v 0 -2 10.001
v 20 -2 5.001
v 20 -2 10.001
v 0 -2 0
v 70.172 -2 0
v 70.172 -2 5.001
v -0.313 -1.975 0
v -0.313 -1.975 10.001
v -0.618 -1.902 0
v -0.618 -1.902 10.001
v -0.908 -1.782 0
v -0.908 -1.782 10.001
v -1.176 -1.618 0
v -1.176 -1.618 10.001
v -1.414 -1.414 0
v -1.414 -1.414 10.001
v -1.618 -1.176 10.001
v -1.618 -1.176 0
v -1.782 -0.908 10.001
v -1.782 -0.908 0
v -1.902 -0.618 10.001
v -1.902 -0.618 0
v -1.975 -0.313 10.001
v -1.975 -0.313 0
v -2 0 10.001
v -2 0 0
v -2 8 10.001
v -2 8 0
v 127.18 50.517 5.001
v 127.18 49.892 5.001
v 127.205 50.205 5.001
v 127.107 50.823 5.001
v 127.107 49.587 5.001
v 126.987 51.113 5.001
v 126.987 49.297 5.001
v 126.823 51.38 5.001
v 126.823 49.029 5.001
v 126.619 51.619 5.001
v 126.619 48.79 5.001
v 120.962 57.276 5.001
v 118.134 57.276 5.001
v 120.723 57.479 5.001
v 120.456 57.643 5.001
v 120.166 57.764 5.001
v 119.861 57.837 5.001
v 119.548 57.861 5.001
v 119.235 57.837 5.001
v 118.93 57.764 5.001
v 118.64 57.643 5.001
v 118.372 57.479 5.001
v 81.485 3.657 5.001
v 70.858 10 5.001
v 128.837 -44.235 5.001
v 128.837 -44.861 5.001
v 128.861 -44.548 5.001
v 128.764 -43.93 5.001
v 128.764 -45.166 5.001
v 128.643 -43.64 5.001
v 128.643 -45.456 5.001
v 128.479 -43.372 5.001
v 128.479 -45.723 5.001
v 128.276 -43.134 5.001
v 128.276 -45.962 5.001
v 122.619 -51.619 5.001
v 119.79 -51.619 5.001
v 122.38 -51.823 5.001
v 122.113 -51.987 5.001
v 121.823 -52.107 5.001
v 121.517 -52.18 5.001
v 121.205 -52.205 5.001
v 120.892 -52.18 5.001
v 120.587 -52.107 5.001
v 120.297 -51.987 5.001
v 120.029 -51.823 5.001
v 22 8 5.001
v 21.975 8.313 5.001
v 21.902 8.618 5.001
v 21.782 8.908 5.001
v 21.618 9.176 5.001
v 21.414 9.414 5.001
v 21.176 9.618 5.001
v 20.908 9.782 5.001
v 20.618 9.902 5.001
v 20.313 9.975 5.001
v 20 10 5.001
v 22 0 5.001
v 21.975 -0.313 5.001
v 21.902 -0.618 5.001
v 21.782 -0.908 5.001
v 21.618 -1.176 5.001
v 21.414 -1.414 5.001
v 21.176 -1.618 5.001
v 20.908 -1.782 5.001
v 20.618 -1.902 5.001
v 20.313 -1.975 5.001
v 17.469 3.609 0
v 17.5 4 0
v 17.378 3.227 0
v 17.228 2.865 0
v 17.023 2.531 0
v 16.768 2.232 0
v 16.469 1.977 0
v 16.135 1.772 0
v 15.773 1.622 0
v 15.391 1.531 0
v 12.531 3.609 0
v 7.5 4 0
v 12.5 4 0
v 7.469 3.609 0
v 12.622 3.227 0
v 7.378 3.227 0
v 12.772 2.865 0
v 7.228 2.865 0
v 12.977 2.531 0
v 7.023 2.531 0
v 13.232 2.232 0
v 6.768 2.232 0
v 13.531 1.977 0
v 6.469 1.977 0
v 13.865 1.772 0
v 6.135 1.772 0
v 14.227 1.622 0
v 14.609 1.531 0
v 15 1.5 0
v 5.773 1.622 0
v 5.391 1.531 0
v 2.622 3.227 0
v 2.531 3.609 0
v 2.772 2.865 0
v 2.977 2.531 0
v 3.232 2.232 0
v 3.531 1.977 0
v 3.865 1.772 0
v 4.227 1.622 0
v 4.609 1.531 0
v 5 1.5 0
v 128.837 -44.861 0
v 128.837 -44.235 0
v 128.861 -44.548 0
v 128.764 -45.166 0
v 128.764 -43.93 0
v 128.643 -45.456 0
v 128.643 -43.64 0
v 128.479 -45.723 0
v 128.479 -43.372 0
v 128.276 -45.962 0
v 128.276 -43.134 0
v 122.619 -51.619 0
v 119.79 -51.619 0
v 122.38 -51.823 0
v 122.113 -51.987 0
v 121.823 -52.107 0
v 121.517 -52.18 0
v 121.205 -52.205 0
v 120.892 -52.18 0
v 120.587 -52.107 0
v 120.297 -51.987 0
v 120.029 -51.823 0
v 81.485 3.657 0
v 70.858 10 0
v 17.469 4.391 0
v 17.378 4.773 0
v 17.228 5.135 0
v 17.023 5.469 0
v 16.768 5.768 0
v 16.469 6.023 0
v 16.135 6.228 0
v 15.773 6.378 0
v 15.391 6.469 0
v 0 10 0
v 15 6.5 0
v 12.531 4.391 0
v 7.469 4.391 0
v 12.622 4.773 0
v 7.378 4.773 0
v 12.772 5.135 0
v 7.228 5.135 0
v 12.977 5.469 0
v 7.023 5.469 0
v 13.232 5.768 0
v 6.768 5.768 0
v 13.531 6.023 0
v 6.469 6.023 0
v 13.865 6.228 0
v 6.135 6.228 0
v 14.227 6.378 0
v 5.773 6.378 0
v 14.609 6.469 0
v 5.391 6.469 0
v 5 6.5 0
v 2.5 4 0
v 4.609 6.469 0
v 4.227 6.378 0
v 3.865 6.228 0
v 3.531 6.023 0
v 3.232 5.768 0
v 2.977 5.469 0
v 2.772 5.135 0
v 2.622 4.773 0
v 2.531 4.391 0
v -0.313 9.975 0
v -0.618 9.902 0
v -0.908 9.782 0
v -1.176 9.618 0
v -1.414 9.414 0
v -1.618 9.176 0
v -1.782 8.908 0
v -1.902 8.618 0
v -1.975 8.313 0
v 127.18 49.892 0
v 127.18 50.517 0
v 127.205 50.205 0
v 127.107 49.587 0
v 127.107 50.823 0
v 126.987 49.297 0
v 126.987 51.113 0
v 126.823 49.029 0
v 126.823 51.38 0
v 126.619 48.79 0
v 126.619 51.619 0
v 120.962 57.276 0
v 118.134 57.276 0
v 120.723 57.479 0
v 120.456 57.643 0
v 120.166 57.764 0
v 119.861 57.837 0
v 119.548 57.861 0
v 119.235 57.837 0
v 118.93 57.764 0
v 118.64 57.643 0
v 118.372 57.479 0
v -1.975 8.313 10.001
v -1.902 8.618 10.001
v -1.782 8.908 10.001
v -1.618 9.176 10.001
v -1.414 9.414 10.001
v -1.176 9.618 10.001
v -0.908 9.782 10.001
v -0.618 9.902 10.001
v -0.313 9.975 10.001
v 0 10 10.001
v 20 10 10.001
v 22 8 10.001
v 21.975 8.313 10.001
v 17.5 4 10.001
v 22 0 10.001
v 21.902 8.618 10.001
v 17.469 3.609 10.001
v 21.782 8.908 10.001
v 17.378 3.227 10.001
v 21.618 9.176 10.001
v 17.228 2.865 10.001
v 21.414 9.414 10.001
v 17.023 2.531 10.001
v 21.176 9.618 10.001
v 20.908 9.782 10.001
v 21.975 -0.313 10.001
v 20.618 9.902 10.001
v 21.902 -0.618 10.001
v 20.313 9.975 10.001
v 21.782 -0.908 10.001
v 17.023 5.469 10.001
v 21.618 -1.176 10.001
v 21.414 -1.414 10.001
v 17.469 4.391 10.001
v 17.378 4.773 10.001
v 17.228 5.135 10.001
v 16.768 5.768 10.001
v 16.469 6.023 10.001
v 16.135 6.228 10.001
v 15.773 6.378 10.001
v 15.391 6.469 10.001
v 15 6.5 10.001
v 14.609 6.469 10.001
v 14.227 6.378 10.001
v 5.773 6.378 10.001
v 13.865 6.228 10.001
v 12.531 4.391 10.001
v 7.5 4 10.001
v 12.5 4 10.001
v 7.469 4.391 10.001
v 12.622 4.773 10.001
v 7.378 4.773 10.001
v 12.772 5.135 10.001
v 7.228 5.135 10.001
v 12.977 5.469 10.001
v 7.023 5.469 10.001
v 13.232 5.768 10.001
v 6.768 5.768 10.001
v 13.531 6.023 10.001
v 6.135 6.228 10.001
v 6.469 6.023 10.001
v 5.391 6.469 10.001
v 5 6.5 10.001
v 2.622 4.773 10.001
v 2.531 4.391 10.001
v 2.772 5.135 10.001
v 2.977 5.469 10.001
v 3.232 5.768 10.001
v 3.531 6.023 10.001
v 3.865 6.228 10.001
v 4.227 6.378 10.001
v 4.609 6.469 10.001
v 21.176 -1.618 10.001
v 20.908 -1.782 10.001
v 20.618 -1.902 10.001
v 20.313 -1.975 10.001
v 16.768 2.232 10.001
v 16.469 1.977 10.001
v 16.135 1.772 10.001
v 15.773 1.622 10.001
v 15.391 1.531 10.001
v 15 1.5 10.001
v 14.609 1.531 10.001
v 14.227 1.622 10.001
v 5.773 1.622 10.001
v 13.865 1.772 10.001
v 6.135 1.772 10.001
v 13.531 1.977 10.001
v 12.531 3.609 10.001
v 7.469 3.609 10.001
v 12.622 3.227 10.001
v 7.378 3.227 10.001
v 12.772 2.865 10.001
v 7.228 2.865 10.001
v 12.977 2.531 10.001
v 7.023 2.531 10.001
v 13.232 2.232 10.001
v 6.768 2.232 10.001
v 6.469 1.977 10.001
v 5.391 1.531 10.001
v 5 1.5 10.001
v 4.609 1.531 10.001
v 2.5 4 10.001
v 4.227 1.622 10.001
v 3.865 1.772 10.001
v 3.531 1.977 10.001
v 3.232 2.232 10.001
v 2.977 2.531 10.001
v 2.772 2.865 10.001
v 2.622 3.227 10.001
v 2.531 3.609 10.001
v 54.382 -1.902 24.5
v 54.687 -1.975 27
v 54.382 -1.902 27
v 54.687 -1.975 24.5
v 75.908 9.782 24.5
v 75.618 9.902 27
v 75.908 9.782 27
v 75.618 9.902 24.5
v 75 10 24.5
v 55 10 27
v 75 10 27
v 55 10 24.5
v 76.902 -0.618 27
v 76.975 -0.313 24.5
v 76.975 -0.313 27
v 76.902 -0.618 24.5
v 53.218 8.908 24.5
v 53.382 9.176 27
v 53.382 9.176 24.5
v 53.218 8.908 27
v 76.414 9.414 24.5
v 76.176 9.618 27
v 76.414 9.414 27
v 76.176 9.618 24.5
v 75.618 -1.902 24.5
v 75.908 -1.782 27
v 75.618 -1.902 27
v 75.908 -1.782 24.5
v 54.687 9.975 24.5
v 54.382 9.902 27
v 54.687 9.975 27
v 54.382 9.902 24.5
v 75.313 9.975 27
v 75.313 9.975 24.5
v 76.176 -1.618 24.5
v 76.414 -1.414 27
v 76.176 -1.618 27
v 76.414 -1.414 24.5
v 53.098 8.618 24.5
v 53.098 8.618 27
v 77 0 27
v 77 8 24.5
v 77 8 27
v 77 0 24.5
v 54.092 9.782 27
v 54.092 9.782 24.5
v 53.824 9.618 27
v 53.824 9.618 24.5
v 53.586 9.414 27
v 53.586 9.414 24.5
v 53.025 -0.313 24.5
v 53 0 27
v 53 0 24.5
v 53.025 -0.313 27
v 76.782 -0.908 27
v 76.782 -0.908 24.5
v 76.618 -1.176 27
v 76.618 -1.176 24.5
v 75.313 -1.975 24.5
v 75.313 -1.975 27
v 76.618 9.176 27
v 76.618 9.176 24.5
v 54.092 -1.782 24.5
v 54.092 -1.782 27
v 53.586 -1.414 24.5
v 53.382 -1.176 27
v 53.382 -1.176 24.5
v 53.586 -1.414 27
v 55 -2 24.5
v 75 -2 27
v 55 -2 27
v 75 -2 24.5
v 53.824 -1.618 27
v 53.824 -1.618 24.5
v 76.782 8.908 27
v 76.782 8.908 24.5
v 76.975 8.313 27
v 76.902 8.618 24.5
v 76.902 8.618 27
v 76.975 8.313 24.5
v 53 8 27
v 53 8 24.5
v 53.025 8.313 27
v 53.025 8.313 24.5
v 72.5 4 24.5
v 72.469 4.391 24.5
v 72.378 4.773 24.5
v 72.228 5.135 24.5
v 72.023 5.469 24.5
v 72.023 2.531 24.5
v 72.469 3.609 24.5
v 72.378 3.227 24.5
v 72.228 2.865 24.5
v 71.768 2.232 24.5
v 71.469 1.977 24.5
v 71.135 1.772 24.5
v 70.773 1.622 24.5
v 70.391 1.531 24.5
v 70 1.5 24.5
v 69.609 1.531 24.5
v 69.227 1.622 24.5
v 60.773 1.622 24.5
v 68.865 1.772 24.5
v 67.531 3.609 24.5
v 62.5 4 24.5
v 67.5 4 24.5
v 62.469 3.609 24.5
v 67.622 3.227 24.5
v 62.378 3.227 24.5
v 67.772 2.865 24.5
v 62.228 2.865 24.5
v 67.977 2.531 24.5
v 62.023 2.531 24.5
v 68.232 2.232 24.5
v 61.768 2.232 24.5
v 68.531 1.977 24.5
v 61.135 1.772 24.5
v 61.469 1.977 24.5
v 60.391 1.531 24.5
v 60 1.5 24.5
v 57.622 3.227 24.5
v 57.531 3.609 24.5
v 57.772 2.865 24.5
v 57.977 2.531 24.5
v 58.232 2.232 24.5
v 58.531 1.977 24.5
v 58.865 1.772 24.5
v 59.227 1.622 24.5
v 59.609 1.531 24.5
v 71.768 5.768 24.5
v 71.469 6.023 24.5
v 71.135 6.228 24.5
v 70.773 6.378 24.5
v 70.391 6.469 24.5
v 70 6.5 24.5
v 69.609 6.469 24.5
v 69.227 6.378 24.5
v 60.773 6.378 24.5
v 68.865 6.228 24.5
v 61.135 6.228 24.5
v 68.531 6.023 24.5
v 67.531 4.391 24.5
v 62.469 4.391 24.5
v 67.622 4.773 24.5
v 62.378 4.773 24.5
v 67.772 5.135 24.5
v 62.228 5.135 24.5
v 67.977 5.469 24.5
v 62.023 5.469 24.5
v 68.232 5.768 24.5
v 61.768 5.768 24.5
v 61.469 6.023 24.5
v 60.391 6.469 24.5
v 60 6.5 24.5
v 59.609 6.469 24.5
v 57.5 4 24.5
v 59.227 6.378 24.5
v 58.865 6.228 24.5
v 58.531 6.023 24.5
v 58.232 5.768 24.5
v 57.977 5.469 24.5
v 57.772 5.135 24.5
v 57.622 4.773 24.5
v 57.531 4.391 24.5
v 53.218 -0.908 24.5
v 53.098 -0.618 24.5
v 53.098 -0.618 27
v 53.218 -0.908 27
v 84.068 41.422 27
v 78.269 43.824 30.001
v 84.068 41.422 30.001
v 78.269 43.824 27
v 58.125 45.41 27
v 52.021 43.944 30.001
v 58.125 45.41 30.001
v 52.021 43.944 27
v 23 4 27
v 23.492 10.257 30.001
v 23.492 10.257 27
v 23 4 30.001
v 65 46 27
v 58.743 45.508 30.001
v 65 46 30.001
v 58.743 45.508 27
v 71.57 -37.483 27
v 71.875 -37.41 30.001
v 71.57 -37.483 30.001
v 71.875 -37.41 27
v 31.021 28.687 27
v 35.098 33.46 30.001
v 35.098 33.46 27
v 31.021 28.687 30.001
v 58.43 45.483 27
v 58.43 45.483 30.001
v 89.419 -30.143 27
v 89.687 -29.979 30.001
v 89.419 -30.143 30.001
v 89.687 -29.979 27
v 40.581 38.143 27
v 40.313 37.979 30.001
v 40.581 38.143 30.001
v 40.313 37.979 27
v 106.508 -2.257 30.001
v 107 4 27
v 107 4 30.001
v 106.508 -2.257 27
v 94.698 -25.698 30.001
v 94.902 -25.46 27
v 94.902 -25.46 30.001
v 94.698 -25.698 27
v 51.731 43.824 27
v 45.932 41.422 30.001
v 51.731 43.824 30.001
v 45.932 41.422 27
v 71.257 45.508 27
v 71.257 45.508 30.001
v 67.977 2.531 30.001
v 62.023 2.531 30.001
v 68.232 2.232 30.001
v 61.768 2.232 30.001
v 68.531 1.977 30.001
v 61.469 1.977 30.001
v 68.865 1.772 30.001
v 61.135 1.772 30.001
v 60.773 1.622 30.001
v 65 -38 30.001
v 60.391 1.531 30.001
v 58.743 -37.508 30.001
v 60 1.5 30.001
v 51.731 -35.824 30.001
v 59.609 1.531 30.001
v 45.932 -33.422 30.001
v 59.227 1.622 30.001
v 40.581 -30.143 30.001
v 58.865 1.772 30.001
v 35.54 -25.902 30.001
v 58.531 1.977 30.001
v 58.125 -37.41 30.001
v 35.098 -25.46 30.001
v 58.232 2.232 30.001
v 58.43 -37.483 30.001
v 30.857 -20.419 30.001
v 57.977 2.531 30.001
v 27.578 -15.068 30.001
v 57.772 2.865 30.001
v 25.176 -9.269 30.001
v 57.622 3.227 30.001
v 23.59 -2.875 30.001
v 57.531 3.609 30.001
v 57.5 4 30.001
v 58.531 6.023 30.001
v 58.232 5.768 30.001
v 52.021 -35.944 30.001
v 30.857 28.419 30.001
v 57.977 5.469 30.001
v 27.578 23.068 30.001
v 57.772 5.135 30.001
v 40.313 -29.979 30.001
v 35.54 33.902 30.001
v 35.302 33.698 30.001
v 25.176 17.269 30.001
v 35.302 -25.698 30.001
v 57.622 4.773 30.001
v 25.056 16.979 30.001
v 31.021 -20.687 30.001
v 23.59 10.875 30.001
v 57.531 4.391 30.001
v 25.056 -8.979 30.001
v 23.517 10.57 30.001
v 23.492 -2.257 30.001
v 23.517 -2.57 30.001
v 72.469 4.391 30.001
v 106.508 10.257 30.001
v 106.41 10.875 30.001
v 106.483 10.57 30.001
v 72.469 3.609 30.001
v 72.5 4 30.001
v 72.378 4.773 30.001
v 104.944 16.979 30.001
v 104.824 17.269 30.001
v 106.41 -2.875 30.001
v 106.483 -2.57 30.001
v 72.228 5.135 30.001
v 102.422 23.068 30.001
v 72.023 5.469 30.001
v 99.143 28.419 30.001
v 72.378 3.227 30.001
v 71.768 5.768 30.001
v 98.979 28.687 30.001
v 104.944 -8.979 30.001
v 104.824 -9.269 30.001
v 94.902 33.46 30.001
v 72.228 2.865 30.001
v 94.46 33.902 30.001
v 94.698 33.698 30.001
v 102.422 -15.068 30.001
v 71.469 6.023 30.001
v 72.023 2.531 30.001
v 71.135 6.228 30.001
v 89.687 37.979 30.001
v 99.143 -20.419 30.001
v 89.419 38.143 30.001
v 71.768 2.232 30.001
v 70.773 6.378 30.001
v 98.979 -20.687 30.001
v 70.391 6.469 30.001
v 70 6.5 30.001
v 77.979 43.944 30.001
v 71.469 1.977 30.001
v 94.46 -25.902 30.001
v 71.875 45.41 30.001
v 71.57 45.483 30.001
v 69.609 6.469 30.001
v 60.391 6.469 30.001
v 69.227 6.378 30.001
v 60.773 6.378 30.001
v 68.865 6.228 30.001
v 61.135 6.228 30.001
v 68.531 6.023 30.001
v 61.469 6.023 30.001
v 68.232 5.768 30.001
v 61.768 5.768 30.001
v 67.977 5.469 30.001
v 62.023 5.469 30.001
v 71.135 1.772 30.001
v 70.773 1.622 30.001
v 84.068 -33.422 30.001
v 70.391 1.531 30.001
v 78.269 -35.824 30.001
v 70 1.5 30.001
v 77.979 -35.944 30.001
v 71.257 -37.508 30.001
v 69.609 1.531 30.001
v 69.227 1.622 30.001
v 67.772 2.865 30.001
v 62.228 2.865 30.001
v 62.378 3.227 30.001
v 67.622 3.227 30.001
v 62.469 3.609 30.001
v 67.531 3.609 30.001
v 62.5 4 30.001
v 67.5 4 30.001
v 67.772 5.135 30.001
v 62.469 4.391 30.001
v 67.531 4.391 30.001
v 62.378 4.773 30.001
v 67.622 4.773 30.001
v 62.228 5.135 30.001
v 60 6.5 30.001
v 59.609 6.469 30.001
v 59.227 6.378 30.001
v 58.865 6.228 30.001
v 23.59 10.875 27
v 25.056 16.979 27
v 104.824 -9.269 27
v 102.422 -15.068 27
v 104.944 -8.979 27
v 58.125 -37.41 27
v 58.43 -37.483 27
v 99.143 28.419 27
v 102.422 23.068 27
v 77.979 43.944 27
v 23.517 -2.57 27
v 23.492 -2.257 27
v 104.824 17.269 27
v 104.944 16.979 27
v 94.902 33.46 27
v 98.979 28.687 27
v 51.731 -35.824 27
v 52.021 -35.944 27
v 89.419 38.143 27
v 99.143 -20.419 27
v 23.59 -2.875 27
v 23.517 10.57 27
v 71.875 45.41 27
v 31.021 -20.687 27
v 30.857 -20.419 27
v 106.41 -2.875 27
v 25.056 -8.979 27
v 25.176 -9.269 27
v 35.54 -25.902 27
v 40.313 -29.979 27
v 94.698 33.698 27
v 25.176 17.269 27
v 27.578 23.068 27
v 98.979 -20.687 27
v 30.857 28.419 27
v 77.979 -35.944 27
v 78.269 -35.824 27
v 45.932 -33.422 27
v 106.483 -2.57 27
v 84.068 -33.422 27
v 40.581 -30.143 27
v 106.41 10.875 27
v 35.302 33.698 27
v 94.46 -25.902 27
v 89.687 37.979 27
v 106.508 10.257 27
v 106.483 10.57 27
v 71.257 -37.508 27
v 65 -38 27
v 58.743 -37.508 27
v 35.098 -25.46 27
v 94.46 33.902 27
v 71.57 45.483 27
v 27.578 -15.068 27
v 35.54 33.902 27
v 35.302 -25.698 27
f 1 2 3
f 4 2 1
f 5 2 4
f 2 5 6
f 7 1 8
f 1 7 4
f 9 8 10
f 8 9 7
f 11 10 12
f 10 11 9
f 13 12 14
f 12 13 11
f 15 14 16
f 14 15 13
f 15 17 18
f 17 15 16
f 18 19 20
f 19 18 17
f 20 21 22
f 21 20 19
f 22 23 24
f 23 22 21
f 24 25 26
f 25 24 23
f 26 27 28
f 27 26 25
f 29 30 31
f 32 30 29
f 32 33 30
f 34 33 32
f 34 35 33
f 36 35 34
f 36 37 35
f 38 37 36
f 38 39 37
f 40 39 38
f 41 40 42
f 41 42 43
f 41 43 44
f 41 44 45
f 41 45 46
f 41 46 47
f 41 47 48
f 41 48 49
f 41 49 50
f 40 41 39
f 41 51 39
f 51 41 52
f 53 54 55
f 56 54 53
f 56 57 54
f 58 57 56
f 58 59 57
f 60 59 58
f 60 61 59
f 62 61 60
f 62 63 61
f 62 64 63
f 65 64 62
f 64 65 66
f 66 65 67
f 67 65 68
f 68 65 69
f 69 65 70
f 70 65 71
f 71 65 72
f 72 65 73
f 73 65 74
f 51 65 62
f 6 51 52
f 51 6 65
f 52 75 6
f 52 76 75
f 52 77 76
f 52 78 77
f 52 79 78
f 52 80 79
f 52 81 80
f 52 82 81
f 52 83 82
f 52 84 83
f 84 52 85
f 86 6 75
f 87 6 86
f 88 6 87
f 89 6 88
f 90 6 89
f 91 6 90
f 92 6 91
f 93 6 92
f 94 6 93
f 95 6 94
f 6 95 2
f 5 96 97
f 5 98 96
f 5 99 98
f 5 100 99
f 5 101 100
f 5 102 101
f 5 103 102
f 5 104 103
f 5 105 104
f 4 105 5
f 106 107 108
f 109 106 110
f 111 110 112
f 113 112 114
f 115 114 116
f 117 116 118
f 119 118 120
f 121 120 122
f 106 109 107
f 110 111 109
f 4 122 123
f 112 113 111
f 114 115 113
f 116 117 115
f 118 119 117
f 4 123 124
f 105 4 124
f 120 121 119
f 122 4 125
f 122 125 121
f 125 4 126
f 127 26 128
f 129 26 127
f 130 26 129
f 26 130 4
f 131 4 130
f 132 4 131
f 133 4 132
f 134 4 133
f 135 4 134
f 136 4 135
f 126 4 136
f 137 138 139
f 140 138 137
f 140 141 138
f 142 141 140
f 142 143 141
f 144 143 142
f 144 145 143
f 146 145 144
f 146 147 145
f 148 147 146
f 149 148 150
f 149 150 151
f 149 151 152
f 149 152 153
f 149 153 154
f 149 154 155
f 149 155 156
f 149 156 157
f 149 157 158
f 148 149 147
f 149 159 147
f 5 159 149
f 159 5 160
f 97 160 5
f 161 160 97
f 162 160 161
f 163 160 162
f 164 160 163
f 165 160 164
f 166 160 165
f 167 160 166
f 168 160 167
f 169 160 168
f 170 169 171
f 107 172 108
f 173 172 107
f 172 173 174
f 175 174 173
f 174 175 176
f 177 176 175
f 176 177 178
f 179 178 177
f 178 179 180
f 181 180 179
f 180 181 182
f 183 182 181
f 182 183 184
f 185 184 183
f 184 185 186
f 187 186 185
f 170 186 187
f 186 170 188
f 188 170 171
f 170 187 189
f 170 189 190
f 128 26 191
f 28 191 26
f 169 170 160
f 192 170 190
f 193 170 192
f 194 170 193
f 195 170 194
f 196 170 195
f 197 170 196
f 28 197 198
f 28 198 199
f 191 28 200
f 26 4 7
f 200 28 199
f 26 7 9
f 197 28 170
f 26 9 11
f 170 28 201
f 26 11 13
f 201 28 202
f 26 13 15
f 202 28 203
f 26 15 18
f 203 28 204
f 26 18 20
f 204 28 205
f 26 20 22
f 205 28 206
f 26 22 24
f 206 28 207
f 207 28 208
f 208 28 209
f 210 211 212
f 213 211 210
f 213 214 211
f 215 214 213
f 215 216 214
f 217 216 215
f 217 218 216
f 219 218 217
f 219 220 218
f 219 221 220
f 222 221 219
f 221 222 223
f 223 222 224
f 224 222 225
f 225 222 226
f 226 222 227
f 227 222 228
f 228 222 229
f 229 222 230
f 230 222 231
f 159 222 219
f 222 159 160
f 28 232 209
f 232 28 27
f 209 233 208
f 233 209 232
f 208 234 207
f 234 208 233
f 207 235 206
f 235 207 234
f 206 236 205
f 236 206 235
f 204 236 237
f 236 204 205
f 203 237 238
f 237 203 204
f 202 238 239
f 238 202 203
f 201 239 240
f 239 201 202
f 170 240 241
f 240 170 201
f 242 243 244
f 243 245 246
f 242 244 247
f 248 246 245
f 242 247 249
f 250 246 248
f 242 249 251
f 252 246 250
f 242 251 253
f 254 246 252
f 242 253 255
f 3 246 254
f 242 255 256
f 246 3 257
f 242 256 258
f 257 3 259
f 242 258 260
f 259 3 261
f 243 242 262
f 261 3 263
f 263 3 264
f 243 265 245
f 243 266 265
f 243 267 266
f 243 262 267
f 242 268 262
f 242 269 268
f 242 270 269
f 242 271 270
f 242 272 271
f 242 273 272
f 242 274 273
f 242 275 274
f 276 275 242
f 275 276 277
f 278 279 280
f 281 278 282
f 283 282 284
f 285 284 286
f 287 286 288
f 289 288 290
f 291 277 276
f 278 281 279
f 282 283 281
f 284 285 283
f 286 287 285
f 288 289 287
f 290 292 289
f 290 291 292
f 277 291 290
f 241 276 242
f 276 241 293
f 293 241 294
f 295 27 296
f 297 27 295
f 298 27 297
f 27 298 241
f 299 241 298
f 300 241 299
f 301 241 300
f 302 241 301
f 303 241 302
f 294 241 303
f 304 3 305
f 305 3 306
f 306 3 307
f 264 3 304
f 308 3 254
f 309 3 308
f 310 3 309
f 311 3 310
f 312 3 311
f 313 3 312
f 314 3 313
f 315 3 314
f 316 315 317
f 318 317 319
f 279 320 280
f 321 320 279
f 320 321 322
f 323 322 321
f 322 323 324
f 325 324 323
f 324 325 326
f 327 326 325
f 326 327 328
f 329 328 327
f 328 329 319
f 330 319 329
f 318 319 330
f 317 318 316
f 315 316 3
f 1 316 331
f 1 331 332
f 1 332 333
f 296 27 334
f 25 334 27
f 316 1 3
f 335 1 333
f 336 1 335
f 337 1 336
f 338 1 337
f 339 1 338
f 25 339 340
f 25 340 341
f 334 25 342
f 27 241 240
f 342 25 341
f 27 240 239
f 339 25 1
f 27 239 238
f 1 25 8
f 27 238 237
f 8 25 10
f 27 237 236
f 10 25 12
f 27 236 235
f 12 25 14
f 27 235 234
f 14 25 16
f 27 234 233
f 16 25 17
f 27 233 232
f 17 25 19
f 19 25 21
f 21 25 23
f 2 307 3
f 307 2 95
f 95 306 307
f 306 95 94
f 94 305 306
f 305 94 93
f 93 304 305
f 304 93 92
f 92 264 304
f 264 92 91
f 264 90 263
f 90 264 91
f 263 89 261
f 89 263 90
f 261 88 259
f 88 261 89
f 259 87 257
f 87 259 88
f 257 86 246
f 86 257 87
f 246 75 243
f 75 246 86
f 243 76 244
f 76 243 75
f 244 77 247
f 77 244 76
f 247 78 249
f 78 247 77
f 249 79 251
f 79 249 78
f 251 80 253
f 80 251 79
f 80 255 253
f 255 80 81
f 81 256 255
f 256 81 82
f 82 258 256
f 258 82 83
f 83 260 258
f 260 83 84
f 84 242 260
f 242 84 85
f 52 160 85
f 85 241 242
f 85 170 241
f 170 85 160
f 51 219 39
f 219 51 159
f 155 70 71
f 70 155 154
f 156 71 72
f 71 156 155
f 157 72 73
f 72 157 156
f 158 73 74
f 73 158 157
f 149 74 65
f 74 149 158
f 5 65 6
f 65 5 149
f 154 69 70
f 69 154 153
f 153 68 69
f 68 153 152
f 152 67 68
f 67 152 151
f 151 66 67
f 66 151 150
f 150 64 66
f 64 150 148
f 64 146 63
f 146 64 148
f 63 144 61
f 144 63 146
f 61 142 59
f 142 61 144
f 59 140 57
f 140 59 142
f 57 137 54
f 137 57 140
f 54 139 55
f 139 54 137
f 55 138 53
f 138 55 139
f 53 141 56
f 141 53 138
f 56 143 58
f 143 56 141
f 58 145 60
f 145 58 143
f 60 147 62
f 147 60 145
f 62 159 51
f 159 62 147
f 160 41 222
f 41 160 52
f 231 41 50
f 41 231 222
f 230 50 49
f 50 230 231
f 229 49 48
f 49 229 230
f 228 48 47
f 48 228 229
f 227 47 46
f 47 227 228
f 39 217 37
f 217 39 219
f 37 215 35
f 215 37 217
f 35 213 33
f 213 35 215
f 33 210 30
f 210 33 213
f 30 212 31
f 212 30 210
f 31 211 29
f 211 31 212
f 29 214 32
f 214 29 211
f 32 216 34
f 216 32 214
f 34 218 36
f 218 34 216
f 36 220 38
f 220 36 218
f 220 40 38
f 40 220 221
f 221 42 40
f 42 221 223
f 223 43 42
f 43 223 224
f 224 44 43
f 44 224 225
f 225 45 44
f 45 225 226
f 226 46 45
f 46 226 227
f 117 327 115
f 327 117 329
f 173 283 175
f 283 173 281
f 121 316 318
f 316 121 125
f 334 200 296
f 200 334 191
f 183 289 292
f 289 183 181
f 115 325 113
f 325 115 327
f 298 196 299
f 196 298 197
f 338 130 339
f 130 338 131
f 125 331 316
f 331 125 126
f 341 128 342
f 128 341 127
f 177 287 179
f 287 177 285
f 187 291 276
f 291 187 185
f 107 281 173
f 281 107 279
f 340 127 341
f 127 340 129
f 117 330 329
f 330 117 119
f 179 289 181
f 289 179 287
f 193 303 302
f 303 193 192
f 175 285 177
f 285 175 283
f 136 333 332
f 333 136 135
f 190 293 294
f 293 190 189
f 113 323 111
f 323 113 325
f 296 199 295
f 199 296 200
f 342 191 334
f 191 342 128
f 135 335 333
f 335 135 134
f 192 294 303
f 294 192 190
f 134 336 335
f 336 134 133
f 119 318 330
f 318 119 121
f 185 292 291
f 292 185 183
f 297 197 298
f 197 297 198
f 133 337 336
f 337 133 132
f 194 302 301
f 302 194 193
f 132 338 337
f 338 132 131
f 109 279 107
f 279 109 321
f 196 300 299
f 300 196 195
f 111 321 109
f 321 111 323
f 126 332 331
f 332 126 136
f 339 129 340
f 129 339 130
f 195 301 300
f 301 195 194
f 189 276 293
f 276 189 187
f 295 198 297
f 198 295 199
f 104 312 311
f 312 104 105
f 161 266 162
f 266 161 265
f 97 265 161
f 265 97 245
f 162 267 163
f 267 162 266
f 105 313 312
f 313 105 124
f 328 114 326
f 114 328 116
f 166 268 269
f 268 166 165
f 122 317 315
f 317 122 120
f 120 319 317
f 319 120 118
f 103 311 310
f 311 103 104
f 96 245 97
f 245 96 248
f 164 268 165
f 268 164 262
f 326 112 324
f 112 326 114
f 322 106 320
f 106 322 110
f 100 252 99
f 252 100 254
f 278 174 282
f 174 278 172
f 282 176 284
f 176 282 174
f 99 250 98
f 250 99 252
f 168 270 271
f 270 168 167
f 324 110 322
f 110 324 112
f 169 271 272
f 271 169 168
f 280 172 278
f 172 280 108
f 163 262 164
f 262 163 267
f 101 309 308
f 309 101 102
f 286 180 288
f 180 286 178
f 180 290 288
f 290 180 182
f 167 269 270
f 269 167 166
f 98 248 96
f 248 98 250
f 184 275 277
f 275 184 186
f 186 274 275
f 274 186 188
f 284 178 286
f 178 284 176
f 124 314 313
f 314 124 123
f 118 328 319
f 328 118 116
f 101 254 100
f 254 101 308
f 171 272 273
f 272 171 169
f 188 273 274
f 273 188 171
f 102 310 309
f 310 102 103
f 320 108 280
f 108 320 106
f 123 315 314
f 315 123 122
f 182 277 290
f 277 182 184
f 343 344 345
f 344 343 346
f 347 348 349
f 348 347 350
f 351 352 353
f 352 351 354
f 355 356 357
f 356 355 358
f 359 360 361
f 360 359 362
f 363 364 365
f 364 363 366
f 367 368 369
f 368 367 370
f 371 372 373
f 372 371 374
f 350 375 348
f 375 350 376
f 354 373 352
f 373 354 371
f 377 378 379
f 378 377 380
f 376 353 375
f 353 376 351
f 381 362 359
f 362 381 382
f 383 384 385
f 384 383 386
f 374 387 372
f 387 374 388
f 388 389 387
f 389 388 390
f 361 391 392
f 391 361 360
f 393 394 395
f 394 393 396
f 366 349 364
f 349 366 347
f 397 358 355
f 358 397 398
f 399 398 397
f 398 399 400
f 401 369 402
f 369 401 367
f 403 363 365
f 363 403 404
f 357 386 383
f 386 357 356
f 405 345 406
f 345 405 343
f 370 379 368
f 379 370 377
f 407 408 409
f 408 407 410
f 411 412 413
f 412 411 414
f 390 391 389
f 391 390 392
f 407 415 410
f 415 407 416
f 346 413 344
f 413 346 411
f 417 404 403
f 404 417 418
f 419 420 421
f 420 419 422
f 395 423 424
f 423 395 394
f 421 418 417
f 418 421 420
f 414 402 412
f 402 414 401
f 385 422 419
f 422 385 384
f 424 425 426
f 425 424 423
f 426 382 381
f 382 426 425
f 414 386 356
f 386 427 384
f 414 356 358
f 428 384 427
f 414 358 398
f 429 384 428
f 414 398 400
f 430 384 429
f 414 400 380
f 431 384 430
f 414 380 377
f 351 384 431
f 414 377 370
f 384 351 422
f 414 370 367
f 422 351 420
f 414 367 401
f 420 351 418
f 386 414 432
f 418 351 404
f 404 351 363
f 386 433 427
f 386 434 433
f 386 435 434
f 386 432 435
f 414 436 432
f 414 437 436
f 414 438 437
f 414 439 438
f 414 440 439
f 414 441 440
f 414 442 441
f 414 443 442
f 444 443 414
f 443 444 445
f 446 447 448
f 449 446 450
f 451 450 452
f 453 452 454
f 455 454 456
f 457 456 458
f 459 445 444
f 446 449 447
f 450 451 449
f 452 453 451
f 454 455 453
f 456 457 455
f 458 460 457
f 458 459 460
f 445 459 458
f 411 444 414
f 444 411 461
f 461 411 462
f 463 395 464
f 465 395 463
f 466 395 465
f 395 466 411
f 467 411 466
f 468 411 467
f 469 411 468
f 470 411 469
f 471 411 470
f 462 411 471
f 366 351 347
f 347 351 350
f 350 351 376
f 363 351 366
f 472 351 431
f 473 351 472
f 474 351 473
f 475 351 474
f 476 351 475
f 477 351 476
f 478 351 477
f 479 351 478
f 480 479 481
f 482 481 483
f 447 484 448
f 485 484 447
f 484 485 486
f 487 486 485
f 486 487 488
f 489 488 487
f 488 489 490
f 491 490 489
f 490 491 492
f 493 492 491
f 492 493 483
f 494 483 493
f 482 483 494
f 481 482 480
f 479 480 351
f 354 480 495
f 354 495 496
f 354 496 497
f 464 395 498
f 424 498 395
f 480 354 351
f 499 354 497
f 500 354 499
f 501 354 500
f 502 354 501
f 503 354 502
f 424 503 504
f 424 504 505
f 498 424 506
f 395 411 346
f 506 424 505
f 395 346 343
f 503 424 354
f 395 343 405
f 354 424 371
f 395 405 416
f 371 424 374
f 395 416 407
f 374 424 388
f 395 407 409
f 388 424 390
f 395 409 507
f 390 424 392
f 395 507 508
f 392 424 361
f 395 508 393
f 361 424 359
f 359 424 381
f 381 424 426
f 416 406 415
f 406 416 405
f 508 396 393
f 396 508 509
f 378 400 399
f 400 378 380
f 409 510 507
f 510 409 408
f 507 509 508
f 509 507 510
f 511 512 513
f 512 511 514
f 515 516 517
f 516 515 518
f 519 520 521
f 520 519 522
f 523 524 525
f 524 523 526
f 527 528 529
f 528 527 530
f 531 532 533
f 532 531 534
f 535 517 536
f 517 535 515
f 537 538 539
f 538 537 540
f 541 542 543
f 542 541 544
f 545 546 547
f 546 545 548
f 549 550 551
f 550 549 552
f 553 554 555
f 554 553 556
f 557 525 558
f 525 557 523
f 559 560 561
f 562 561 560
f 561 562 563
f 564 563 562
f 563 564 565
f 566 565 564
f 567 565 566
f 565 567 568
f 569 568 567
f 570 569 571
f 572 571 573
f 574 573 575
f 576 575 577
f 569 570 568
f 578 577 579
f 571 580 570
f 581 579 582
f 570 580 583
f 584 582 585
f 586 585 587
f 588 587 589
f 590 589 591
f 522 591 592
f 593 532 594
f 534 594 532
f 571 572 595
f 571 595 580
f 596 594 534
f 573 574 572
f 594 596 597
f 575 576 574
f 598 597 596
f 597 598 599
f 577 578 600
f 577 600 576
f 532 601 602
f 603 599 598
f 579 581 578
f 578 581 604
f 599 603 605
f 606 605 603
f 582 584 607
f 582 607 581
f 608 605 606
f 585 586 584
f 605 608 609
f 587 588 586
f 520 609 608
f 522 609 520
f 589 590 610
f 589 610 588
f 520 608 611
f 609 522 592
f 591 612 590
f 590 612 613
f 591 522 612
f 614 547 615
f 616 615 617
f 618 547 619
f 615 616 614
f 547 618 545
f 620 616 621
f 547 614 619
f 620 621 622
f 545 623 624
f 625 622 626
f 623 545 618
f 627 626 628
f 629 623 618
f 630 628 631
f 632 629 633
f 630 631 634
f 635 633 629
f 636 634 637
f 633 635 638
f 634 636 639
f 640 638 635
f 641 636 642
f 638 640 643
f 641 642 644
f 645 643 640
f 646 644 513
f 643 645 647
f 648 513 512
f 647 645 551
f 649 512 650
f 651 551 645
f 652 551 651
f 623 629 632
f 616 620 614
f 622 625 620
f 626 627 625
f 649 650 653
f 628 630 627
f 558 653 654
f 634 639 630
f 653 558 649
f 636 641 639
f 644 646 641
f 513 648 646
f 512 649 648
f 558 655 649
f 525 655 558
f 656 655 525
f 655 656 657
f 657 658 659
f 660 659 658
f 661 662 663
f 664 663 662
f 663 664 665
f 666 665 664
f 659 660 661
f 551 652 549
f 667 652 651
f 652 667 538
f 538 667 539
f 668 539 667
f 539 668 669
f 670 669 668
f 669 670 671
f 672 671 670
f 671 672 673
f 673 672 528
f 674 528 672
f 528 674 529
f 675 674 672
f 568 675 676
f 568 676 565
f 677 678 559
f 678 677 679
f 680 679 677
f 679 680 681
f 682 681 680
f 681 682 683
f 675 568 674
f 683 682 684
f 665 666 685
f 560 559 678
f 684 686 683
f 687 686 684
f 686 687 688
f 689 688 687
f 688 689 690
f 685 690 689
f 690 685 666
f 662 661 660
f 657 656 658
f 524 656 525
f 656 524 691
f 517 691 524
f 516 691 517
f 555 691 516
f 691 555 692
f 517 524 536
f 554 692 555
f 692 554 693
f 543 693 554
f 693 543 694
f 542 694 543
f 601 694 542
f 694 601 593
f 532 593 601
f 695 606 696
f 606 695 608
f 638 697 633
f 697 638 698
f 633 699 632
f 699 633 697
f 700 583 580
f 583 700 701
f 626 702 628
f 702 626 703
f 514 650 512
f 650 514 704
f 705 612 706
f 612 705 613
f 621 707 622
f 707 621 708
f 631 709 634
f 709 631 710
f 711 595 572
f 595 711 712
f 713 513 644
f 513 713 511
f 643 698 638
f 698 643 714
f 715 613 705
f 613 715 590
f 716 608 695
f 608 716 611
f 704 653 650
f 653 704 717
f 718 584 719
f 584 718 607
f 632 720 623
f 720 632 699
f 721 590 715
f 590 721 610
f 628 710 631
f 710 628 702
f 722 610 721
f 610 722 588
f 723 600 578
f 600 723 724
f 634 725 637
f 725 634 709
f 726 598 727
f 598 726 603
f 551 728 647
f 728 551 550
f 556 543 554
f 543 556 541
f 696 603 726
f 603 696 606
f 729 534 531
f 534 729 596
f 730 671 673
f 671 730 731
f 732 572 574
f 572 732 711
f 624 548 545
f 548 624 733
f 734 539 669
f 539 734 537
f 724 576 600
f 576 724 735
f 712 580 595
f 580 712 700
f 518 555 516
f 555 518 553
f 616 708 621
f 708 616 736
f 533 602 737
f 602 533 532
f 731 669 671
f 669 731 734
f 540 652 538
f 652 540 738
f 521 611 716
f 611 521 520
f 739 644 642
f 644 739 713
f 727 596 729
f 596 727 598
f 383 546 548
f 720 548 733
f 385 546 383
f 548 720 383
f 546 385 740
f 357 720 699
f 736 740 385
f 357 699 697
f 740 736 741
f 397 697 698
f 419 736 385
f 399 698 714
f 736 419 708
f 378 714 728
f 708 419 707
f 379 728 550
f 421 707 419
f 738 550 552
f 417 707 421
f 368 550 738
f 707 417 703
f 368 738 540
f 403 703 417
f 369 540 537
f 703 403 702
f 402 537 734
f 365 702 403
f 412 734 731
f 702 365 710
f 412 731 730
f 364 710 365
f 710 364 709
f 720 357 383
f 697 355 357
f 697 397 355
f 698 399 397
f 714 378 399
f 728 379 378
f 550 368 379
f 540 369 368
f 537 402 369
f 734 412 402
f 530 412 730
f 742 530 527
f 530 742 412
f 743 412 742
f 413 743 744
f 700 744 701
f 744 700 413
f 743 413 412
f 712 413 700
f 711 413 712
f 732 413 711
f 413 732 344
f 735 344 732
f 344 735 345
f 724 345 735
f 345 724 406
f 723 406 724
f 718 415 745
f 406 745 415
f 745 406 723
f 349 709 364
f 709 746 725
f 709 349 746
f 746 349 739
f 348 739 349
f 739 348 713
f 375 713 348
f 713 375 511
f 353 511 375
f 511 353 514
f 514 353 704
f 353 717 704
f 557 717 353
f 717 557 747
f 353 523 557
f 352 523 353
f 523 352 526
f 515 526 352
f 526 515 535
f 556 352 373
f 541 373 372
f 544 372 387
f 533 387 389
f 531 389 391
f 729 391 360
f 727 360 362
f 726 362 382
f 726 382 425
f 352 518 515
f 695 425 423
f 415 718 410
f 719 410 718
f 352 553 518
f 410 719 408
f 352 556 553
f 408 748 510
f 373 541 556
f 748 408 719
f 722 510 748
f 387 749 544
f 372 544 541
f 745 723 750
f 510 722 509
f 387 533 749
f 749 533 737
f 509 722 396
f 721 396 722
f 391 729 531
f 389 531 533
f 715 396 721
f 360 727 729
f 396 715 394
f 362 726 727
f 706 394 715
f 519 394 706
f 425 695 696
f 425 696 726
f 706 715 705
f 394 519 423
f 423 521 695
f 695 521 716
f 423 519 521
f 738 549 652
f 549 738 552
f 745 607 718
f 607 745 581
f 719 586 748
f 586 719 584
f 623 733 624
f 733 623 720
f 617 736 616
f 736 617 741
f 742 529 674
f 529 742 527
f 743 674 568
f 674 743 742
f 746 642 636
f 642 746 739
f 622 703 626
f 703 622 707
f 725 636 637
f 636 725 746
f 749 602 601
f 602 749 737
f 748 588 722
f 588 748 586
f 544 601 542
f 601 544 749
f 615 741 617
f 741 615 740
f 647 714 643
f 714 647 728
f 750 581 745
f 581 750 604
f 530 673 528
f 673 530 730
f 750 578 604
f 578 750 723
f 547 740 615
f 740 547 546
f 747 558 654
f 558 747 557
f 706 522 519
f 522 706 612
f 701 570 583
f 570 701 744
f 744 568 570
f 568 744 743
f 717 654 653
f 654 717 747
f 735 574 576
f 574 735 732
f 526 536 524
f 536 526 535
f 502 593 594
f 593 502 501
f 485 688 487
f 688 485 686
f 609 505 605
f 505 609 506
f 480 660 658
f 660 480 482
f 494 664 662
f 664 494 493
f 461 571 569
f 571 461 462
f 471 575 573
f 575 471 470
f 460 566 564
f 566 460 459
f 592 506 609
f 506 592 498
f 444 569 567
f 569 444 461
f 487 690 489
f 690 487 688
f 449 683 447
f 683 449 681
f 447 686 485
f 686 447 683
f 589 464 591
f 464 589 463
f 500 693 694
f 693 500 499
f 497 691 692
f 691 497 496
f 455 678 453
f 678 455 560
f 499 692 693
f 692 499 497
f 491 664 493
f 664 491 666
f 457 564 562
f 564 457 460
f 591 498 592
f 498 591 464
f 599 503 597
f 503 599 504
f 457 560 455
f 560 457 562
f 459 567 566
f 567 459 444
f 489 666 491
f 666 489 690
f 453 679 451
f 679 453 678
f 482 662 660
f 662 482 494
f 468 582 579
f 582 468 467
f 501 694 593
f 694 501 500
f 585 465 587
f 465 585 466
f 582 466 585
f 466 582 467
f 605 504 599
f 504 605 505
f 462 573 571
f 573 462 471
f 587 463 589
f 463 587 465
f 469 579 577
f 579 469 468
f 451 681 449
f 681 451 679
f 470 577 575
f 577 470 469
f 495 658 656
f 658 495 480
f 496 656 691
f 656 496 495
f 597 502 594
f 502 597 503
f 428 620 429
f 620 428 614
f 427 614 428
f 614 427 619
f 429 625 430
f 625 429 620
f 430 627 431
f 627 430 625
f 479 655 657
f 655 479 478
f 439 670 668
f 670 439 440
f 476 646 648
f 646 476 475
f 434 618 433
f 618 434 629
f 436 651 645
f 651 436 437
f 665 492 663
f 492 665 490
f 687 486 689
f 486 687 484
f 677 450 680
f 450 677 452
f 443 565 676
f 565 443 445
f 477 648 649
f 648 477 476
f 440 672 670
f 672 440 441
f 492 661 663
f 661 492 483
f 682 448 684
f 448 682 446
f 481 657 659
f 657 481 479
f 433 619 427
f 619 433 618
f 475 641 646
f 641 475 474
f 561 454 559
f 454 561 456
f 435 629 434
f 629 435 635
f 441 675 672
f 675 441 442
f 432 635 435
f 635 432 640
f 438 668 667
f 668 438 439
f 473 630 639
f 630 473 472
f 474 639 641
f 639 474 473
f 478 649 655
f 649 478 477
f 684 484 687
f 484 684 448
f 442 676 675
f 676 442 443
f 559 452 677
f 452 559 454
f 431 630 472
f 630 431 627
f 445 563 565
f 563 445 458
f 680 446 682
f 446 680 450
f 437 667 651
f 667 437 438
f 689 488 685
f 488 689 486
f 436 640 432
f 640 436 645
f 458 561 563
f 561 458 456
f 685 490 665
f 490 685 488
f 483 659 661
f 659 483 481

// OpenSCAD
 $fn=40;

module loadcell_scale_base(){
   
    render()difference(){
        
    minkowski(){
        
        union(){
            cube([75-4,12-4,5]);
            translate([0,0,5])cube([20,12-4,5]);
             translate([75,0,0])rotate(a=45, v=[0,0,1])cube([75-4,12-4,5]);
            translate([75-4,0,0])rotate(a=-45, v=[0,0,1])cube([75-4,12-4,5]);
        }
       
        cylinder(r=2,h=0.001);
    }
    
        color("red")translate([5,6-2,0])cylinder(r=2.5, h=12);
        color("red")translate([15,6-2,0])cylinder(r=2.5, h=12);
        
    
    }   
}

module load_scale_bed(){
    render()difference(){
        minkowski(){
            union(){
            translate([0,0,0])cube([20,12-4,5], center=true);
            cylinder(r=40, h=3);
        }
            cylinder(r=2,h=0.001);
        }
        color("red")translate([-5,0,0])cylinder(r=2.5, h=12, center=true);
        color("red")translate([5,0,0])cylinder(r=2.5, h=12, center=true);
        }
    }

loadcell_scale_base();
translate([10+75-20,4,15+12])load_scale_bed();
